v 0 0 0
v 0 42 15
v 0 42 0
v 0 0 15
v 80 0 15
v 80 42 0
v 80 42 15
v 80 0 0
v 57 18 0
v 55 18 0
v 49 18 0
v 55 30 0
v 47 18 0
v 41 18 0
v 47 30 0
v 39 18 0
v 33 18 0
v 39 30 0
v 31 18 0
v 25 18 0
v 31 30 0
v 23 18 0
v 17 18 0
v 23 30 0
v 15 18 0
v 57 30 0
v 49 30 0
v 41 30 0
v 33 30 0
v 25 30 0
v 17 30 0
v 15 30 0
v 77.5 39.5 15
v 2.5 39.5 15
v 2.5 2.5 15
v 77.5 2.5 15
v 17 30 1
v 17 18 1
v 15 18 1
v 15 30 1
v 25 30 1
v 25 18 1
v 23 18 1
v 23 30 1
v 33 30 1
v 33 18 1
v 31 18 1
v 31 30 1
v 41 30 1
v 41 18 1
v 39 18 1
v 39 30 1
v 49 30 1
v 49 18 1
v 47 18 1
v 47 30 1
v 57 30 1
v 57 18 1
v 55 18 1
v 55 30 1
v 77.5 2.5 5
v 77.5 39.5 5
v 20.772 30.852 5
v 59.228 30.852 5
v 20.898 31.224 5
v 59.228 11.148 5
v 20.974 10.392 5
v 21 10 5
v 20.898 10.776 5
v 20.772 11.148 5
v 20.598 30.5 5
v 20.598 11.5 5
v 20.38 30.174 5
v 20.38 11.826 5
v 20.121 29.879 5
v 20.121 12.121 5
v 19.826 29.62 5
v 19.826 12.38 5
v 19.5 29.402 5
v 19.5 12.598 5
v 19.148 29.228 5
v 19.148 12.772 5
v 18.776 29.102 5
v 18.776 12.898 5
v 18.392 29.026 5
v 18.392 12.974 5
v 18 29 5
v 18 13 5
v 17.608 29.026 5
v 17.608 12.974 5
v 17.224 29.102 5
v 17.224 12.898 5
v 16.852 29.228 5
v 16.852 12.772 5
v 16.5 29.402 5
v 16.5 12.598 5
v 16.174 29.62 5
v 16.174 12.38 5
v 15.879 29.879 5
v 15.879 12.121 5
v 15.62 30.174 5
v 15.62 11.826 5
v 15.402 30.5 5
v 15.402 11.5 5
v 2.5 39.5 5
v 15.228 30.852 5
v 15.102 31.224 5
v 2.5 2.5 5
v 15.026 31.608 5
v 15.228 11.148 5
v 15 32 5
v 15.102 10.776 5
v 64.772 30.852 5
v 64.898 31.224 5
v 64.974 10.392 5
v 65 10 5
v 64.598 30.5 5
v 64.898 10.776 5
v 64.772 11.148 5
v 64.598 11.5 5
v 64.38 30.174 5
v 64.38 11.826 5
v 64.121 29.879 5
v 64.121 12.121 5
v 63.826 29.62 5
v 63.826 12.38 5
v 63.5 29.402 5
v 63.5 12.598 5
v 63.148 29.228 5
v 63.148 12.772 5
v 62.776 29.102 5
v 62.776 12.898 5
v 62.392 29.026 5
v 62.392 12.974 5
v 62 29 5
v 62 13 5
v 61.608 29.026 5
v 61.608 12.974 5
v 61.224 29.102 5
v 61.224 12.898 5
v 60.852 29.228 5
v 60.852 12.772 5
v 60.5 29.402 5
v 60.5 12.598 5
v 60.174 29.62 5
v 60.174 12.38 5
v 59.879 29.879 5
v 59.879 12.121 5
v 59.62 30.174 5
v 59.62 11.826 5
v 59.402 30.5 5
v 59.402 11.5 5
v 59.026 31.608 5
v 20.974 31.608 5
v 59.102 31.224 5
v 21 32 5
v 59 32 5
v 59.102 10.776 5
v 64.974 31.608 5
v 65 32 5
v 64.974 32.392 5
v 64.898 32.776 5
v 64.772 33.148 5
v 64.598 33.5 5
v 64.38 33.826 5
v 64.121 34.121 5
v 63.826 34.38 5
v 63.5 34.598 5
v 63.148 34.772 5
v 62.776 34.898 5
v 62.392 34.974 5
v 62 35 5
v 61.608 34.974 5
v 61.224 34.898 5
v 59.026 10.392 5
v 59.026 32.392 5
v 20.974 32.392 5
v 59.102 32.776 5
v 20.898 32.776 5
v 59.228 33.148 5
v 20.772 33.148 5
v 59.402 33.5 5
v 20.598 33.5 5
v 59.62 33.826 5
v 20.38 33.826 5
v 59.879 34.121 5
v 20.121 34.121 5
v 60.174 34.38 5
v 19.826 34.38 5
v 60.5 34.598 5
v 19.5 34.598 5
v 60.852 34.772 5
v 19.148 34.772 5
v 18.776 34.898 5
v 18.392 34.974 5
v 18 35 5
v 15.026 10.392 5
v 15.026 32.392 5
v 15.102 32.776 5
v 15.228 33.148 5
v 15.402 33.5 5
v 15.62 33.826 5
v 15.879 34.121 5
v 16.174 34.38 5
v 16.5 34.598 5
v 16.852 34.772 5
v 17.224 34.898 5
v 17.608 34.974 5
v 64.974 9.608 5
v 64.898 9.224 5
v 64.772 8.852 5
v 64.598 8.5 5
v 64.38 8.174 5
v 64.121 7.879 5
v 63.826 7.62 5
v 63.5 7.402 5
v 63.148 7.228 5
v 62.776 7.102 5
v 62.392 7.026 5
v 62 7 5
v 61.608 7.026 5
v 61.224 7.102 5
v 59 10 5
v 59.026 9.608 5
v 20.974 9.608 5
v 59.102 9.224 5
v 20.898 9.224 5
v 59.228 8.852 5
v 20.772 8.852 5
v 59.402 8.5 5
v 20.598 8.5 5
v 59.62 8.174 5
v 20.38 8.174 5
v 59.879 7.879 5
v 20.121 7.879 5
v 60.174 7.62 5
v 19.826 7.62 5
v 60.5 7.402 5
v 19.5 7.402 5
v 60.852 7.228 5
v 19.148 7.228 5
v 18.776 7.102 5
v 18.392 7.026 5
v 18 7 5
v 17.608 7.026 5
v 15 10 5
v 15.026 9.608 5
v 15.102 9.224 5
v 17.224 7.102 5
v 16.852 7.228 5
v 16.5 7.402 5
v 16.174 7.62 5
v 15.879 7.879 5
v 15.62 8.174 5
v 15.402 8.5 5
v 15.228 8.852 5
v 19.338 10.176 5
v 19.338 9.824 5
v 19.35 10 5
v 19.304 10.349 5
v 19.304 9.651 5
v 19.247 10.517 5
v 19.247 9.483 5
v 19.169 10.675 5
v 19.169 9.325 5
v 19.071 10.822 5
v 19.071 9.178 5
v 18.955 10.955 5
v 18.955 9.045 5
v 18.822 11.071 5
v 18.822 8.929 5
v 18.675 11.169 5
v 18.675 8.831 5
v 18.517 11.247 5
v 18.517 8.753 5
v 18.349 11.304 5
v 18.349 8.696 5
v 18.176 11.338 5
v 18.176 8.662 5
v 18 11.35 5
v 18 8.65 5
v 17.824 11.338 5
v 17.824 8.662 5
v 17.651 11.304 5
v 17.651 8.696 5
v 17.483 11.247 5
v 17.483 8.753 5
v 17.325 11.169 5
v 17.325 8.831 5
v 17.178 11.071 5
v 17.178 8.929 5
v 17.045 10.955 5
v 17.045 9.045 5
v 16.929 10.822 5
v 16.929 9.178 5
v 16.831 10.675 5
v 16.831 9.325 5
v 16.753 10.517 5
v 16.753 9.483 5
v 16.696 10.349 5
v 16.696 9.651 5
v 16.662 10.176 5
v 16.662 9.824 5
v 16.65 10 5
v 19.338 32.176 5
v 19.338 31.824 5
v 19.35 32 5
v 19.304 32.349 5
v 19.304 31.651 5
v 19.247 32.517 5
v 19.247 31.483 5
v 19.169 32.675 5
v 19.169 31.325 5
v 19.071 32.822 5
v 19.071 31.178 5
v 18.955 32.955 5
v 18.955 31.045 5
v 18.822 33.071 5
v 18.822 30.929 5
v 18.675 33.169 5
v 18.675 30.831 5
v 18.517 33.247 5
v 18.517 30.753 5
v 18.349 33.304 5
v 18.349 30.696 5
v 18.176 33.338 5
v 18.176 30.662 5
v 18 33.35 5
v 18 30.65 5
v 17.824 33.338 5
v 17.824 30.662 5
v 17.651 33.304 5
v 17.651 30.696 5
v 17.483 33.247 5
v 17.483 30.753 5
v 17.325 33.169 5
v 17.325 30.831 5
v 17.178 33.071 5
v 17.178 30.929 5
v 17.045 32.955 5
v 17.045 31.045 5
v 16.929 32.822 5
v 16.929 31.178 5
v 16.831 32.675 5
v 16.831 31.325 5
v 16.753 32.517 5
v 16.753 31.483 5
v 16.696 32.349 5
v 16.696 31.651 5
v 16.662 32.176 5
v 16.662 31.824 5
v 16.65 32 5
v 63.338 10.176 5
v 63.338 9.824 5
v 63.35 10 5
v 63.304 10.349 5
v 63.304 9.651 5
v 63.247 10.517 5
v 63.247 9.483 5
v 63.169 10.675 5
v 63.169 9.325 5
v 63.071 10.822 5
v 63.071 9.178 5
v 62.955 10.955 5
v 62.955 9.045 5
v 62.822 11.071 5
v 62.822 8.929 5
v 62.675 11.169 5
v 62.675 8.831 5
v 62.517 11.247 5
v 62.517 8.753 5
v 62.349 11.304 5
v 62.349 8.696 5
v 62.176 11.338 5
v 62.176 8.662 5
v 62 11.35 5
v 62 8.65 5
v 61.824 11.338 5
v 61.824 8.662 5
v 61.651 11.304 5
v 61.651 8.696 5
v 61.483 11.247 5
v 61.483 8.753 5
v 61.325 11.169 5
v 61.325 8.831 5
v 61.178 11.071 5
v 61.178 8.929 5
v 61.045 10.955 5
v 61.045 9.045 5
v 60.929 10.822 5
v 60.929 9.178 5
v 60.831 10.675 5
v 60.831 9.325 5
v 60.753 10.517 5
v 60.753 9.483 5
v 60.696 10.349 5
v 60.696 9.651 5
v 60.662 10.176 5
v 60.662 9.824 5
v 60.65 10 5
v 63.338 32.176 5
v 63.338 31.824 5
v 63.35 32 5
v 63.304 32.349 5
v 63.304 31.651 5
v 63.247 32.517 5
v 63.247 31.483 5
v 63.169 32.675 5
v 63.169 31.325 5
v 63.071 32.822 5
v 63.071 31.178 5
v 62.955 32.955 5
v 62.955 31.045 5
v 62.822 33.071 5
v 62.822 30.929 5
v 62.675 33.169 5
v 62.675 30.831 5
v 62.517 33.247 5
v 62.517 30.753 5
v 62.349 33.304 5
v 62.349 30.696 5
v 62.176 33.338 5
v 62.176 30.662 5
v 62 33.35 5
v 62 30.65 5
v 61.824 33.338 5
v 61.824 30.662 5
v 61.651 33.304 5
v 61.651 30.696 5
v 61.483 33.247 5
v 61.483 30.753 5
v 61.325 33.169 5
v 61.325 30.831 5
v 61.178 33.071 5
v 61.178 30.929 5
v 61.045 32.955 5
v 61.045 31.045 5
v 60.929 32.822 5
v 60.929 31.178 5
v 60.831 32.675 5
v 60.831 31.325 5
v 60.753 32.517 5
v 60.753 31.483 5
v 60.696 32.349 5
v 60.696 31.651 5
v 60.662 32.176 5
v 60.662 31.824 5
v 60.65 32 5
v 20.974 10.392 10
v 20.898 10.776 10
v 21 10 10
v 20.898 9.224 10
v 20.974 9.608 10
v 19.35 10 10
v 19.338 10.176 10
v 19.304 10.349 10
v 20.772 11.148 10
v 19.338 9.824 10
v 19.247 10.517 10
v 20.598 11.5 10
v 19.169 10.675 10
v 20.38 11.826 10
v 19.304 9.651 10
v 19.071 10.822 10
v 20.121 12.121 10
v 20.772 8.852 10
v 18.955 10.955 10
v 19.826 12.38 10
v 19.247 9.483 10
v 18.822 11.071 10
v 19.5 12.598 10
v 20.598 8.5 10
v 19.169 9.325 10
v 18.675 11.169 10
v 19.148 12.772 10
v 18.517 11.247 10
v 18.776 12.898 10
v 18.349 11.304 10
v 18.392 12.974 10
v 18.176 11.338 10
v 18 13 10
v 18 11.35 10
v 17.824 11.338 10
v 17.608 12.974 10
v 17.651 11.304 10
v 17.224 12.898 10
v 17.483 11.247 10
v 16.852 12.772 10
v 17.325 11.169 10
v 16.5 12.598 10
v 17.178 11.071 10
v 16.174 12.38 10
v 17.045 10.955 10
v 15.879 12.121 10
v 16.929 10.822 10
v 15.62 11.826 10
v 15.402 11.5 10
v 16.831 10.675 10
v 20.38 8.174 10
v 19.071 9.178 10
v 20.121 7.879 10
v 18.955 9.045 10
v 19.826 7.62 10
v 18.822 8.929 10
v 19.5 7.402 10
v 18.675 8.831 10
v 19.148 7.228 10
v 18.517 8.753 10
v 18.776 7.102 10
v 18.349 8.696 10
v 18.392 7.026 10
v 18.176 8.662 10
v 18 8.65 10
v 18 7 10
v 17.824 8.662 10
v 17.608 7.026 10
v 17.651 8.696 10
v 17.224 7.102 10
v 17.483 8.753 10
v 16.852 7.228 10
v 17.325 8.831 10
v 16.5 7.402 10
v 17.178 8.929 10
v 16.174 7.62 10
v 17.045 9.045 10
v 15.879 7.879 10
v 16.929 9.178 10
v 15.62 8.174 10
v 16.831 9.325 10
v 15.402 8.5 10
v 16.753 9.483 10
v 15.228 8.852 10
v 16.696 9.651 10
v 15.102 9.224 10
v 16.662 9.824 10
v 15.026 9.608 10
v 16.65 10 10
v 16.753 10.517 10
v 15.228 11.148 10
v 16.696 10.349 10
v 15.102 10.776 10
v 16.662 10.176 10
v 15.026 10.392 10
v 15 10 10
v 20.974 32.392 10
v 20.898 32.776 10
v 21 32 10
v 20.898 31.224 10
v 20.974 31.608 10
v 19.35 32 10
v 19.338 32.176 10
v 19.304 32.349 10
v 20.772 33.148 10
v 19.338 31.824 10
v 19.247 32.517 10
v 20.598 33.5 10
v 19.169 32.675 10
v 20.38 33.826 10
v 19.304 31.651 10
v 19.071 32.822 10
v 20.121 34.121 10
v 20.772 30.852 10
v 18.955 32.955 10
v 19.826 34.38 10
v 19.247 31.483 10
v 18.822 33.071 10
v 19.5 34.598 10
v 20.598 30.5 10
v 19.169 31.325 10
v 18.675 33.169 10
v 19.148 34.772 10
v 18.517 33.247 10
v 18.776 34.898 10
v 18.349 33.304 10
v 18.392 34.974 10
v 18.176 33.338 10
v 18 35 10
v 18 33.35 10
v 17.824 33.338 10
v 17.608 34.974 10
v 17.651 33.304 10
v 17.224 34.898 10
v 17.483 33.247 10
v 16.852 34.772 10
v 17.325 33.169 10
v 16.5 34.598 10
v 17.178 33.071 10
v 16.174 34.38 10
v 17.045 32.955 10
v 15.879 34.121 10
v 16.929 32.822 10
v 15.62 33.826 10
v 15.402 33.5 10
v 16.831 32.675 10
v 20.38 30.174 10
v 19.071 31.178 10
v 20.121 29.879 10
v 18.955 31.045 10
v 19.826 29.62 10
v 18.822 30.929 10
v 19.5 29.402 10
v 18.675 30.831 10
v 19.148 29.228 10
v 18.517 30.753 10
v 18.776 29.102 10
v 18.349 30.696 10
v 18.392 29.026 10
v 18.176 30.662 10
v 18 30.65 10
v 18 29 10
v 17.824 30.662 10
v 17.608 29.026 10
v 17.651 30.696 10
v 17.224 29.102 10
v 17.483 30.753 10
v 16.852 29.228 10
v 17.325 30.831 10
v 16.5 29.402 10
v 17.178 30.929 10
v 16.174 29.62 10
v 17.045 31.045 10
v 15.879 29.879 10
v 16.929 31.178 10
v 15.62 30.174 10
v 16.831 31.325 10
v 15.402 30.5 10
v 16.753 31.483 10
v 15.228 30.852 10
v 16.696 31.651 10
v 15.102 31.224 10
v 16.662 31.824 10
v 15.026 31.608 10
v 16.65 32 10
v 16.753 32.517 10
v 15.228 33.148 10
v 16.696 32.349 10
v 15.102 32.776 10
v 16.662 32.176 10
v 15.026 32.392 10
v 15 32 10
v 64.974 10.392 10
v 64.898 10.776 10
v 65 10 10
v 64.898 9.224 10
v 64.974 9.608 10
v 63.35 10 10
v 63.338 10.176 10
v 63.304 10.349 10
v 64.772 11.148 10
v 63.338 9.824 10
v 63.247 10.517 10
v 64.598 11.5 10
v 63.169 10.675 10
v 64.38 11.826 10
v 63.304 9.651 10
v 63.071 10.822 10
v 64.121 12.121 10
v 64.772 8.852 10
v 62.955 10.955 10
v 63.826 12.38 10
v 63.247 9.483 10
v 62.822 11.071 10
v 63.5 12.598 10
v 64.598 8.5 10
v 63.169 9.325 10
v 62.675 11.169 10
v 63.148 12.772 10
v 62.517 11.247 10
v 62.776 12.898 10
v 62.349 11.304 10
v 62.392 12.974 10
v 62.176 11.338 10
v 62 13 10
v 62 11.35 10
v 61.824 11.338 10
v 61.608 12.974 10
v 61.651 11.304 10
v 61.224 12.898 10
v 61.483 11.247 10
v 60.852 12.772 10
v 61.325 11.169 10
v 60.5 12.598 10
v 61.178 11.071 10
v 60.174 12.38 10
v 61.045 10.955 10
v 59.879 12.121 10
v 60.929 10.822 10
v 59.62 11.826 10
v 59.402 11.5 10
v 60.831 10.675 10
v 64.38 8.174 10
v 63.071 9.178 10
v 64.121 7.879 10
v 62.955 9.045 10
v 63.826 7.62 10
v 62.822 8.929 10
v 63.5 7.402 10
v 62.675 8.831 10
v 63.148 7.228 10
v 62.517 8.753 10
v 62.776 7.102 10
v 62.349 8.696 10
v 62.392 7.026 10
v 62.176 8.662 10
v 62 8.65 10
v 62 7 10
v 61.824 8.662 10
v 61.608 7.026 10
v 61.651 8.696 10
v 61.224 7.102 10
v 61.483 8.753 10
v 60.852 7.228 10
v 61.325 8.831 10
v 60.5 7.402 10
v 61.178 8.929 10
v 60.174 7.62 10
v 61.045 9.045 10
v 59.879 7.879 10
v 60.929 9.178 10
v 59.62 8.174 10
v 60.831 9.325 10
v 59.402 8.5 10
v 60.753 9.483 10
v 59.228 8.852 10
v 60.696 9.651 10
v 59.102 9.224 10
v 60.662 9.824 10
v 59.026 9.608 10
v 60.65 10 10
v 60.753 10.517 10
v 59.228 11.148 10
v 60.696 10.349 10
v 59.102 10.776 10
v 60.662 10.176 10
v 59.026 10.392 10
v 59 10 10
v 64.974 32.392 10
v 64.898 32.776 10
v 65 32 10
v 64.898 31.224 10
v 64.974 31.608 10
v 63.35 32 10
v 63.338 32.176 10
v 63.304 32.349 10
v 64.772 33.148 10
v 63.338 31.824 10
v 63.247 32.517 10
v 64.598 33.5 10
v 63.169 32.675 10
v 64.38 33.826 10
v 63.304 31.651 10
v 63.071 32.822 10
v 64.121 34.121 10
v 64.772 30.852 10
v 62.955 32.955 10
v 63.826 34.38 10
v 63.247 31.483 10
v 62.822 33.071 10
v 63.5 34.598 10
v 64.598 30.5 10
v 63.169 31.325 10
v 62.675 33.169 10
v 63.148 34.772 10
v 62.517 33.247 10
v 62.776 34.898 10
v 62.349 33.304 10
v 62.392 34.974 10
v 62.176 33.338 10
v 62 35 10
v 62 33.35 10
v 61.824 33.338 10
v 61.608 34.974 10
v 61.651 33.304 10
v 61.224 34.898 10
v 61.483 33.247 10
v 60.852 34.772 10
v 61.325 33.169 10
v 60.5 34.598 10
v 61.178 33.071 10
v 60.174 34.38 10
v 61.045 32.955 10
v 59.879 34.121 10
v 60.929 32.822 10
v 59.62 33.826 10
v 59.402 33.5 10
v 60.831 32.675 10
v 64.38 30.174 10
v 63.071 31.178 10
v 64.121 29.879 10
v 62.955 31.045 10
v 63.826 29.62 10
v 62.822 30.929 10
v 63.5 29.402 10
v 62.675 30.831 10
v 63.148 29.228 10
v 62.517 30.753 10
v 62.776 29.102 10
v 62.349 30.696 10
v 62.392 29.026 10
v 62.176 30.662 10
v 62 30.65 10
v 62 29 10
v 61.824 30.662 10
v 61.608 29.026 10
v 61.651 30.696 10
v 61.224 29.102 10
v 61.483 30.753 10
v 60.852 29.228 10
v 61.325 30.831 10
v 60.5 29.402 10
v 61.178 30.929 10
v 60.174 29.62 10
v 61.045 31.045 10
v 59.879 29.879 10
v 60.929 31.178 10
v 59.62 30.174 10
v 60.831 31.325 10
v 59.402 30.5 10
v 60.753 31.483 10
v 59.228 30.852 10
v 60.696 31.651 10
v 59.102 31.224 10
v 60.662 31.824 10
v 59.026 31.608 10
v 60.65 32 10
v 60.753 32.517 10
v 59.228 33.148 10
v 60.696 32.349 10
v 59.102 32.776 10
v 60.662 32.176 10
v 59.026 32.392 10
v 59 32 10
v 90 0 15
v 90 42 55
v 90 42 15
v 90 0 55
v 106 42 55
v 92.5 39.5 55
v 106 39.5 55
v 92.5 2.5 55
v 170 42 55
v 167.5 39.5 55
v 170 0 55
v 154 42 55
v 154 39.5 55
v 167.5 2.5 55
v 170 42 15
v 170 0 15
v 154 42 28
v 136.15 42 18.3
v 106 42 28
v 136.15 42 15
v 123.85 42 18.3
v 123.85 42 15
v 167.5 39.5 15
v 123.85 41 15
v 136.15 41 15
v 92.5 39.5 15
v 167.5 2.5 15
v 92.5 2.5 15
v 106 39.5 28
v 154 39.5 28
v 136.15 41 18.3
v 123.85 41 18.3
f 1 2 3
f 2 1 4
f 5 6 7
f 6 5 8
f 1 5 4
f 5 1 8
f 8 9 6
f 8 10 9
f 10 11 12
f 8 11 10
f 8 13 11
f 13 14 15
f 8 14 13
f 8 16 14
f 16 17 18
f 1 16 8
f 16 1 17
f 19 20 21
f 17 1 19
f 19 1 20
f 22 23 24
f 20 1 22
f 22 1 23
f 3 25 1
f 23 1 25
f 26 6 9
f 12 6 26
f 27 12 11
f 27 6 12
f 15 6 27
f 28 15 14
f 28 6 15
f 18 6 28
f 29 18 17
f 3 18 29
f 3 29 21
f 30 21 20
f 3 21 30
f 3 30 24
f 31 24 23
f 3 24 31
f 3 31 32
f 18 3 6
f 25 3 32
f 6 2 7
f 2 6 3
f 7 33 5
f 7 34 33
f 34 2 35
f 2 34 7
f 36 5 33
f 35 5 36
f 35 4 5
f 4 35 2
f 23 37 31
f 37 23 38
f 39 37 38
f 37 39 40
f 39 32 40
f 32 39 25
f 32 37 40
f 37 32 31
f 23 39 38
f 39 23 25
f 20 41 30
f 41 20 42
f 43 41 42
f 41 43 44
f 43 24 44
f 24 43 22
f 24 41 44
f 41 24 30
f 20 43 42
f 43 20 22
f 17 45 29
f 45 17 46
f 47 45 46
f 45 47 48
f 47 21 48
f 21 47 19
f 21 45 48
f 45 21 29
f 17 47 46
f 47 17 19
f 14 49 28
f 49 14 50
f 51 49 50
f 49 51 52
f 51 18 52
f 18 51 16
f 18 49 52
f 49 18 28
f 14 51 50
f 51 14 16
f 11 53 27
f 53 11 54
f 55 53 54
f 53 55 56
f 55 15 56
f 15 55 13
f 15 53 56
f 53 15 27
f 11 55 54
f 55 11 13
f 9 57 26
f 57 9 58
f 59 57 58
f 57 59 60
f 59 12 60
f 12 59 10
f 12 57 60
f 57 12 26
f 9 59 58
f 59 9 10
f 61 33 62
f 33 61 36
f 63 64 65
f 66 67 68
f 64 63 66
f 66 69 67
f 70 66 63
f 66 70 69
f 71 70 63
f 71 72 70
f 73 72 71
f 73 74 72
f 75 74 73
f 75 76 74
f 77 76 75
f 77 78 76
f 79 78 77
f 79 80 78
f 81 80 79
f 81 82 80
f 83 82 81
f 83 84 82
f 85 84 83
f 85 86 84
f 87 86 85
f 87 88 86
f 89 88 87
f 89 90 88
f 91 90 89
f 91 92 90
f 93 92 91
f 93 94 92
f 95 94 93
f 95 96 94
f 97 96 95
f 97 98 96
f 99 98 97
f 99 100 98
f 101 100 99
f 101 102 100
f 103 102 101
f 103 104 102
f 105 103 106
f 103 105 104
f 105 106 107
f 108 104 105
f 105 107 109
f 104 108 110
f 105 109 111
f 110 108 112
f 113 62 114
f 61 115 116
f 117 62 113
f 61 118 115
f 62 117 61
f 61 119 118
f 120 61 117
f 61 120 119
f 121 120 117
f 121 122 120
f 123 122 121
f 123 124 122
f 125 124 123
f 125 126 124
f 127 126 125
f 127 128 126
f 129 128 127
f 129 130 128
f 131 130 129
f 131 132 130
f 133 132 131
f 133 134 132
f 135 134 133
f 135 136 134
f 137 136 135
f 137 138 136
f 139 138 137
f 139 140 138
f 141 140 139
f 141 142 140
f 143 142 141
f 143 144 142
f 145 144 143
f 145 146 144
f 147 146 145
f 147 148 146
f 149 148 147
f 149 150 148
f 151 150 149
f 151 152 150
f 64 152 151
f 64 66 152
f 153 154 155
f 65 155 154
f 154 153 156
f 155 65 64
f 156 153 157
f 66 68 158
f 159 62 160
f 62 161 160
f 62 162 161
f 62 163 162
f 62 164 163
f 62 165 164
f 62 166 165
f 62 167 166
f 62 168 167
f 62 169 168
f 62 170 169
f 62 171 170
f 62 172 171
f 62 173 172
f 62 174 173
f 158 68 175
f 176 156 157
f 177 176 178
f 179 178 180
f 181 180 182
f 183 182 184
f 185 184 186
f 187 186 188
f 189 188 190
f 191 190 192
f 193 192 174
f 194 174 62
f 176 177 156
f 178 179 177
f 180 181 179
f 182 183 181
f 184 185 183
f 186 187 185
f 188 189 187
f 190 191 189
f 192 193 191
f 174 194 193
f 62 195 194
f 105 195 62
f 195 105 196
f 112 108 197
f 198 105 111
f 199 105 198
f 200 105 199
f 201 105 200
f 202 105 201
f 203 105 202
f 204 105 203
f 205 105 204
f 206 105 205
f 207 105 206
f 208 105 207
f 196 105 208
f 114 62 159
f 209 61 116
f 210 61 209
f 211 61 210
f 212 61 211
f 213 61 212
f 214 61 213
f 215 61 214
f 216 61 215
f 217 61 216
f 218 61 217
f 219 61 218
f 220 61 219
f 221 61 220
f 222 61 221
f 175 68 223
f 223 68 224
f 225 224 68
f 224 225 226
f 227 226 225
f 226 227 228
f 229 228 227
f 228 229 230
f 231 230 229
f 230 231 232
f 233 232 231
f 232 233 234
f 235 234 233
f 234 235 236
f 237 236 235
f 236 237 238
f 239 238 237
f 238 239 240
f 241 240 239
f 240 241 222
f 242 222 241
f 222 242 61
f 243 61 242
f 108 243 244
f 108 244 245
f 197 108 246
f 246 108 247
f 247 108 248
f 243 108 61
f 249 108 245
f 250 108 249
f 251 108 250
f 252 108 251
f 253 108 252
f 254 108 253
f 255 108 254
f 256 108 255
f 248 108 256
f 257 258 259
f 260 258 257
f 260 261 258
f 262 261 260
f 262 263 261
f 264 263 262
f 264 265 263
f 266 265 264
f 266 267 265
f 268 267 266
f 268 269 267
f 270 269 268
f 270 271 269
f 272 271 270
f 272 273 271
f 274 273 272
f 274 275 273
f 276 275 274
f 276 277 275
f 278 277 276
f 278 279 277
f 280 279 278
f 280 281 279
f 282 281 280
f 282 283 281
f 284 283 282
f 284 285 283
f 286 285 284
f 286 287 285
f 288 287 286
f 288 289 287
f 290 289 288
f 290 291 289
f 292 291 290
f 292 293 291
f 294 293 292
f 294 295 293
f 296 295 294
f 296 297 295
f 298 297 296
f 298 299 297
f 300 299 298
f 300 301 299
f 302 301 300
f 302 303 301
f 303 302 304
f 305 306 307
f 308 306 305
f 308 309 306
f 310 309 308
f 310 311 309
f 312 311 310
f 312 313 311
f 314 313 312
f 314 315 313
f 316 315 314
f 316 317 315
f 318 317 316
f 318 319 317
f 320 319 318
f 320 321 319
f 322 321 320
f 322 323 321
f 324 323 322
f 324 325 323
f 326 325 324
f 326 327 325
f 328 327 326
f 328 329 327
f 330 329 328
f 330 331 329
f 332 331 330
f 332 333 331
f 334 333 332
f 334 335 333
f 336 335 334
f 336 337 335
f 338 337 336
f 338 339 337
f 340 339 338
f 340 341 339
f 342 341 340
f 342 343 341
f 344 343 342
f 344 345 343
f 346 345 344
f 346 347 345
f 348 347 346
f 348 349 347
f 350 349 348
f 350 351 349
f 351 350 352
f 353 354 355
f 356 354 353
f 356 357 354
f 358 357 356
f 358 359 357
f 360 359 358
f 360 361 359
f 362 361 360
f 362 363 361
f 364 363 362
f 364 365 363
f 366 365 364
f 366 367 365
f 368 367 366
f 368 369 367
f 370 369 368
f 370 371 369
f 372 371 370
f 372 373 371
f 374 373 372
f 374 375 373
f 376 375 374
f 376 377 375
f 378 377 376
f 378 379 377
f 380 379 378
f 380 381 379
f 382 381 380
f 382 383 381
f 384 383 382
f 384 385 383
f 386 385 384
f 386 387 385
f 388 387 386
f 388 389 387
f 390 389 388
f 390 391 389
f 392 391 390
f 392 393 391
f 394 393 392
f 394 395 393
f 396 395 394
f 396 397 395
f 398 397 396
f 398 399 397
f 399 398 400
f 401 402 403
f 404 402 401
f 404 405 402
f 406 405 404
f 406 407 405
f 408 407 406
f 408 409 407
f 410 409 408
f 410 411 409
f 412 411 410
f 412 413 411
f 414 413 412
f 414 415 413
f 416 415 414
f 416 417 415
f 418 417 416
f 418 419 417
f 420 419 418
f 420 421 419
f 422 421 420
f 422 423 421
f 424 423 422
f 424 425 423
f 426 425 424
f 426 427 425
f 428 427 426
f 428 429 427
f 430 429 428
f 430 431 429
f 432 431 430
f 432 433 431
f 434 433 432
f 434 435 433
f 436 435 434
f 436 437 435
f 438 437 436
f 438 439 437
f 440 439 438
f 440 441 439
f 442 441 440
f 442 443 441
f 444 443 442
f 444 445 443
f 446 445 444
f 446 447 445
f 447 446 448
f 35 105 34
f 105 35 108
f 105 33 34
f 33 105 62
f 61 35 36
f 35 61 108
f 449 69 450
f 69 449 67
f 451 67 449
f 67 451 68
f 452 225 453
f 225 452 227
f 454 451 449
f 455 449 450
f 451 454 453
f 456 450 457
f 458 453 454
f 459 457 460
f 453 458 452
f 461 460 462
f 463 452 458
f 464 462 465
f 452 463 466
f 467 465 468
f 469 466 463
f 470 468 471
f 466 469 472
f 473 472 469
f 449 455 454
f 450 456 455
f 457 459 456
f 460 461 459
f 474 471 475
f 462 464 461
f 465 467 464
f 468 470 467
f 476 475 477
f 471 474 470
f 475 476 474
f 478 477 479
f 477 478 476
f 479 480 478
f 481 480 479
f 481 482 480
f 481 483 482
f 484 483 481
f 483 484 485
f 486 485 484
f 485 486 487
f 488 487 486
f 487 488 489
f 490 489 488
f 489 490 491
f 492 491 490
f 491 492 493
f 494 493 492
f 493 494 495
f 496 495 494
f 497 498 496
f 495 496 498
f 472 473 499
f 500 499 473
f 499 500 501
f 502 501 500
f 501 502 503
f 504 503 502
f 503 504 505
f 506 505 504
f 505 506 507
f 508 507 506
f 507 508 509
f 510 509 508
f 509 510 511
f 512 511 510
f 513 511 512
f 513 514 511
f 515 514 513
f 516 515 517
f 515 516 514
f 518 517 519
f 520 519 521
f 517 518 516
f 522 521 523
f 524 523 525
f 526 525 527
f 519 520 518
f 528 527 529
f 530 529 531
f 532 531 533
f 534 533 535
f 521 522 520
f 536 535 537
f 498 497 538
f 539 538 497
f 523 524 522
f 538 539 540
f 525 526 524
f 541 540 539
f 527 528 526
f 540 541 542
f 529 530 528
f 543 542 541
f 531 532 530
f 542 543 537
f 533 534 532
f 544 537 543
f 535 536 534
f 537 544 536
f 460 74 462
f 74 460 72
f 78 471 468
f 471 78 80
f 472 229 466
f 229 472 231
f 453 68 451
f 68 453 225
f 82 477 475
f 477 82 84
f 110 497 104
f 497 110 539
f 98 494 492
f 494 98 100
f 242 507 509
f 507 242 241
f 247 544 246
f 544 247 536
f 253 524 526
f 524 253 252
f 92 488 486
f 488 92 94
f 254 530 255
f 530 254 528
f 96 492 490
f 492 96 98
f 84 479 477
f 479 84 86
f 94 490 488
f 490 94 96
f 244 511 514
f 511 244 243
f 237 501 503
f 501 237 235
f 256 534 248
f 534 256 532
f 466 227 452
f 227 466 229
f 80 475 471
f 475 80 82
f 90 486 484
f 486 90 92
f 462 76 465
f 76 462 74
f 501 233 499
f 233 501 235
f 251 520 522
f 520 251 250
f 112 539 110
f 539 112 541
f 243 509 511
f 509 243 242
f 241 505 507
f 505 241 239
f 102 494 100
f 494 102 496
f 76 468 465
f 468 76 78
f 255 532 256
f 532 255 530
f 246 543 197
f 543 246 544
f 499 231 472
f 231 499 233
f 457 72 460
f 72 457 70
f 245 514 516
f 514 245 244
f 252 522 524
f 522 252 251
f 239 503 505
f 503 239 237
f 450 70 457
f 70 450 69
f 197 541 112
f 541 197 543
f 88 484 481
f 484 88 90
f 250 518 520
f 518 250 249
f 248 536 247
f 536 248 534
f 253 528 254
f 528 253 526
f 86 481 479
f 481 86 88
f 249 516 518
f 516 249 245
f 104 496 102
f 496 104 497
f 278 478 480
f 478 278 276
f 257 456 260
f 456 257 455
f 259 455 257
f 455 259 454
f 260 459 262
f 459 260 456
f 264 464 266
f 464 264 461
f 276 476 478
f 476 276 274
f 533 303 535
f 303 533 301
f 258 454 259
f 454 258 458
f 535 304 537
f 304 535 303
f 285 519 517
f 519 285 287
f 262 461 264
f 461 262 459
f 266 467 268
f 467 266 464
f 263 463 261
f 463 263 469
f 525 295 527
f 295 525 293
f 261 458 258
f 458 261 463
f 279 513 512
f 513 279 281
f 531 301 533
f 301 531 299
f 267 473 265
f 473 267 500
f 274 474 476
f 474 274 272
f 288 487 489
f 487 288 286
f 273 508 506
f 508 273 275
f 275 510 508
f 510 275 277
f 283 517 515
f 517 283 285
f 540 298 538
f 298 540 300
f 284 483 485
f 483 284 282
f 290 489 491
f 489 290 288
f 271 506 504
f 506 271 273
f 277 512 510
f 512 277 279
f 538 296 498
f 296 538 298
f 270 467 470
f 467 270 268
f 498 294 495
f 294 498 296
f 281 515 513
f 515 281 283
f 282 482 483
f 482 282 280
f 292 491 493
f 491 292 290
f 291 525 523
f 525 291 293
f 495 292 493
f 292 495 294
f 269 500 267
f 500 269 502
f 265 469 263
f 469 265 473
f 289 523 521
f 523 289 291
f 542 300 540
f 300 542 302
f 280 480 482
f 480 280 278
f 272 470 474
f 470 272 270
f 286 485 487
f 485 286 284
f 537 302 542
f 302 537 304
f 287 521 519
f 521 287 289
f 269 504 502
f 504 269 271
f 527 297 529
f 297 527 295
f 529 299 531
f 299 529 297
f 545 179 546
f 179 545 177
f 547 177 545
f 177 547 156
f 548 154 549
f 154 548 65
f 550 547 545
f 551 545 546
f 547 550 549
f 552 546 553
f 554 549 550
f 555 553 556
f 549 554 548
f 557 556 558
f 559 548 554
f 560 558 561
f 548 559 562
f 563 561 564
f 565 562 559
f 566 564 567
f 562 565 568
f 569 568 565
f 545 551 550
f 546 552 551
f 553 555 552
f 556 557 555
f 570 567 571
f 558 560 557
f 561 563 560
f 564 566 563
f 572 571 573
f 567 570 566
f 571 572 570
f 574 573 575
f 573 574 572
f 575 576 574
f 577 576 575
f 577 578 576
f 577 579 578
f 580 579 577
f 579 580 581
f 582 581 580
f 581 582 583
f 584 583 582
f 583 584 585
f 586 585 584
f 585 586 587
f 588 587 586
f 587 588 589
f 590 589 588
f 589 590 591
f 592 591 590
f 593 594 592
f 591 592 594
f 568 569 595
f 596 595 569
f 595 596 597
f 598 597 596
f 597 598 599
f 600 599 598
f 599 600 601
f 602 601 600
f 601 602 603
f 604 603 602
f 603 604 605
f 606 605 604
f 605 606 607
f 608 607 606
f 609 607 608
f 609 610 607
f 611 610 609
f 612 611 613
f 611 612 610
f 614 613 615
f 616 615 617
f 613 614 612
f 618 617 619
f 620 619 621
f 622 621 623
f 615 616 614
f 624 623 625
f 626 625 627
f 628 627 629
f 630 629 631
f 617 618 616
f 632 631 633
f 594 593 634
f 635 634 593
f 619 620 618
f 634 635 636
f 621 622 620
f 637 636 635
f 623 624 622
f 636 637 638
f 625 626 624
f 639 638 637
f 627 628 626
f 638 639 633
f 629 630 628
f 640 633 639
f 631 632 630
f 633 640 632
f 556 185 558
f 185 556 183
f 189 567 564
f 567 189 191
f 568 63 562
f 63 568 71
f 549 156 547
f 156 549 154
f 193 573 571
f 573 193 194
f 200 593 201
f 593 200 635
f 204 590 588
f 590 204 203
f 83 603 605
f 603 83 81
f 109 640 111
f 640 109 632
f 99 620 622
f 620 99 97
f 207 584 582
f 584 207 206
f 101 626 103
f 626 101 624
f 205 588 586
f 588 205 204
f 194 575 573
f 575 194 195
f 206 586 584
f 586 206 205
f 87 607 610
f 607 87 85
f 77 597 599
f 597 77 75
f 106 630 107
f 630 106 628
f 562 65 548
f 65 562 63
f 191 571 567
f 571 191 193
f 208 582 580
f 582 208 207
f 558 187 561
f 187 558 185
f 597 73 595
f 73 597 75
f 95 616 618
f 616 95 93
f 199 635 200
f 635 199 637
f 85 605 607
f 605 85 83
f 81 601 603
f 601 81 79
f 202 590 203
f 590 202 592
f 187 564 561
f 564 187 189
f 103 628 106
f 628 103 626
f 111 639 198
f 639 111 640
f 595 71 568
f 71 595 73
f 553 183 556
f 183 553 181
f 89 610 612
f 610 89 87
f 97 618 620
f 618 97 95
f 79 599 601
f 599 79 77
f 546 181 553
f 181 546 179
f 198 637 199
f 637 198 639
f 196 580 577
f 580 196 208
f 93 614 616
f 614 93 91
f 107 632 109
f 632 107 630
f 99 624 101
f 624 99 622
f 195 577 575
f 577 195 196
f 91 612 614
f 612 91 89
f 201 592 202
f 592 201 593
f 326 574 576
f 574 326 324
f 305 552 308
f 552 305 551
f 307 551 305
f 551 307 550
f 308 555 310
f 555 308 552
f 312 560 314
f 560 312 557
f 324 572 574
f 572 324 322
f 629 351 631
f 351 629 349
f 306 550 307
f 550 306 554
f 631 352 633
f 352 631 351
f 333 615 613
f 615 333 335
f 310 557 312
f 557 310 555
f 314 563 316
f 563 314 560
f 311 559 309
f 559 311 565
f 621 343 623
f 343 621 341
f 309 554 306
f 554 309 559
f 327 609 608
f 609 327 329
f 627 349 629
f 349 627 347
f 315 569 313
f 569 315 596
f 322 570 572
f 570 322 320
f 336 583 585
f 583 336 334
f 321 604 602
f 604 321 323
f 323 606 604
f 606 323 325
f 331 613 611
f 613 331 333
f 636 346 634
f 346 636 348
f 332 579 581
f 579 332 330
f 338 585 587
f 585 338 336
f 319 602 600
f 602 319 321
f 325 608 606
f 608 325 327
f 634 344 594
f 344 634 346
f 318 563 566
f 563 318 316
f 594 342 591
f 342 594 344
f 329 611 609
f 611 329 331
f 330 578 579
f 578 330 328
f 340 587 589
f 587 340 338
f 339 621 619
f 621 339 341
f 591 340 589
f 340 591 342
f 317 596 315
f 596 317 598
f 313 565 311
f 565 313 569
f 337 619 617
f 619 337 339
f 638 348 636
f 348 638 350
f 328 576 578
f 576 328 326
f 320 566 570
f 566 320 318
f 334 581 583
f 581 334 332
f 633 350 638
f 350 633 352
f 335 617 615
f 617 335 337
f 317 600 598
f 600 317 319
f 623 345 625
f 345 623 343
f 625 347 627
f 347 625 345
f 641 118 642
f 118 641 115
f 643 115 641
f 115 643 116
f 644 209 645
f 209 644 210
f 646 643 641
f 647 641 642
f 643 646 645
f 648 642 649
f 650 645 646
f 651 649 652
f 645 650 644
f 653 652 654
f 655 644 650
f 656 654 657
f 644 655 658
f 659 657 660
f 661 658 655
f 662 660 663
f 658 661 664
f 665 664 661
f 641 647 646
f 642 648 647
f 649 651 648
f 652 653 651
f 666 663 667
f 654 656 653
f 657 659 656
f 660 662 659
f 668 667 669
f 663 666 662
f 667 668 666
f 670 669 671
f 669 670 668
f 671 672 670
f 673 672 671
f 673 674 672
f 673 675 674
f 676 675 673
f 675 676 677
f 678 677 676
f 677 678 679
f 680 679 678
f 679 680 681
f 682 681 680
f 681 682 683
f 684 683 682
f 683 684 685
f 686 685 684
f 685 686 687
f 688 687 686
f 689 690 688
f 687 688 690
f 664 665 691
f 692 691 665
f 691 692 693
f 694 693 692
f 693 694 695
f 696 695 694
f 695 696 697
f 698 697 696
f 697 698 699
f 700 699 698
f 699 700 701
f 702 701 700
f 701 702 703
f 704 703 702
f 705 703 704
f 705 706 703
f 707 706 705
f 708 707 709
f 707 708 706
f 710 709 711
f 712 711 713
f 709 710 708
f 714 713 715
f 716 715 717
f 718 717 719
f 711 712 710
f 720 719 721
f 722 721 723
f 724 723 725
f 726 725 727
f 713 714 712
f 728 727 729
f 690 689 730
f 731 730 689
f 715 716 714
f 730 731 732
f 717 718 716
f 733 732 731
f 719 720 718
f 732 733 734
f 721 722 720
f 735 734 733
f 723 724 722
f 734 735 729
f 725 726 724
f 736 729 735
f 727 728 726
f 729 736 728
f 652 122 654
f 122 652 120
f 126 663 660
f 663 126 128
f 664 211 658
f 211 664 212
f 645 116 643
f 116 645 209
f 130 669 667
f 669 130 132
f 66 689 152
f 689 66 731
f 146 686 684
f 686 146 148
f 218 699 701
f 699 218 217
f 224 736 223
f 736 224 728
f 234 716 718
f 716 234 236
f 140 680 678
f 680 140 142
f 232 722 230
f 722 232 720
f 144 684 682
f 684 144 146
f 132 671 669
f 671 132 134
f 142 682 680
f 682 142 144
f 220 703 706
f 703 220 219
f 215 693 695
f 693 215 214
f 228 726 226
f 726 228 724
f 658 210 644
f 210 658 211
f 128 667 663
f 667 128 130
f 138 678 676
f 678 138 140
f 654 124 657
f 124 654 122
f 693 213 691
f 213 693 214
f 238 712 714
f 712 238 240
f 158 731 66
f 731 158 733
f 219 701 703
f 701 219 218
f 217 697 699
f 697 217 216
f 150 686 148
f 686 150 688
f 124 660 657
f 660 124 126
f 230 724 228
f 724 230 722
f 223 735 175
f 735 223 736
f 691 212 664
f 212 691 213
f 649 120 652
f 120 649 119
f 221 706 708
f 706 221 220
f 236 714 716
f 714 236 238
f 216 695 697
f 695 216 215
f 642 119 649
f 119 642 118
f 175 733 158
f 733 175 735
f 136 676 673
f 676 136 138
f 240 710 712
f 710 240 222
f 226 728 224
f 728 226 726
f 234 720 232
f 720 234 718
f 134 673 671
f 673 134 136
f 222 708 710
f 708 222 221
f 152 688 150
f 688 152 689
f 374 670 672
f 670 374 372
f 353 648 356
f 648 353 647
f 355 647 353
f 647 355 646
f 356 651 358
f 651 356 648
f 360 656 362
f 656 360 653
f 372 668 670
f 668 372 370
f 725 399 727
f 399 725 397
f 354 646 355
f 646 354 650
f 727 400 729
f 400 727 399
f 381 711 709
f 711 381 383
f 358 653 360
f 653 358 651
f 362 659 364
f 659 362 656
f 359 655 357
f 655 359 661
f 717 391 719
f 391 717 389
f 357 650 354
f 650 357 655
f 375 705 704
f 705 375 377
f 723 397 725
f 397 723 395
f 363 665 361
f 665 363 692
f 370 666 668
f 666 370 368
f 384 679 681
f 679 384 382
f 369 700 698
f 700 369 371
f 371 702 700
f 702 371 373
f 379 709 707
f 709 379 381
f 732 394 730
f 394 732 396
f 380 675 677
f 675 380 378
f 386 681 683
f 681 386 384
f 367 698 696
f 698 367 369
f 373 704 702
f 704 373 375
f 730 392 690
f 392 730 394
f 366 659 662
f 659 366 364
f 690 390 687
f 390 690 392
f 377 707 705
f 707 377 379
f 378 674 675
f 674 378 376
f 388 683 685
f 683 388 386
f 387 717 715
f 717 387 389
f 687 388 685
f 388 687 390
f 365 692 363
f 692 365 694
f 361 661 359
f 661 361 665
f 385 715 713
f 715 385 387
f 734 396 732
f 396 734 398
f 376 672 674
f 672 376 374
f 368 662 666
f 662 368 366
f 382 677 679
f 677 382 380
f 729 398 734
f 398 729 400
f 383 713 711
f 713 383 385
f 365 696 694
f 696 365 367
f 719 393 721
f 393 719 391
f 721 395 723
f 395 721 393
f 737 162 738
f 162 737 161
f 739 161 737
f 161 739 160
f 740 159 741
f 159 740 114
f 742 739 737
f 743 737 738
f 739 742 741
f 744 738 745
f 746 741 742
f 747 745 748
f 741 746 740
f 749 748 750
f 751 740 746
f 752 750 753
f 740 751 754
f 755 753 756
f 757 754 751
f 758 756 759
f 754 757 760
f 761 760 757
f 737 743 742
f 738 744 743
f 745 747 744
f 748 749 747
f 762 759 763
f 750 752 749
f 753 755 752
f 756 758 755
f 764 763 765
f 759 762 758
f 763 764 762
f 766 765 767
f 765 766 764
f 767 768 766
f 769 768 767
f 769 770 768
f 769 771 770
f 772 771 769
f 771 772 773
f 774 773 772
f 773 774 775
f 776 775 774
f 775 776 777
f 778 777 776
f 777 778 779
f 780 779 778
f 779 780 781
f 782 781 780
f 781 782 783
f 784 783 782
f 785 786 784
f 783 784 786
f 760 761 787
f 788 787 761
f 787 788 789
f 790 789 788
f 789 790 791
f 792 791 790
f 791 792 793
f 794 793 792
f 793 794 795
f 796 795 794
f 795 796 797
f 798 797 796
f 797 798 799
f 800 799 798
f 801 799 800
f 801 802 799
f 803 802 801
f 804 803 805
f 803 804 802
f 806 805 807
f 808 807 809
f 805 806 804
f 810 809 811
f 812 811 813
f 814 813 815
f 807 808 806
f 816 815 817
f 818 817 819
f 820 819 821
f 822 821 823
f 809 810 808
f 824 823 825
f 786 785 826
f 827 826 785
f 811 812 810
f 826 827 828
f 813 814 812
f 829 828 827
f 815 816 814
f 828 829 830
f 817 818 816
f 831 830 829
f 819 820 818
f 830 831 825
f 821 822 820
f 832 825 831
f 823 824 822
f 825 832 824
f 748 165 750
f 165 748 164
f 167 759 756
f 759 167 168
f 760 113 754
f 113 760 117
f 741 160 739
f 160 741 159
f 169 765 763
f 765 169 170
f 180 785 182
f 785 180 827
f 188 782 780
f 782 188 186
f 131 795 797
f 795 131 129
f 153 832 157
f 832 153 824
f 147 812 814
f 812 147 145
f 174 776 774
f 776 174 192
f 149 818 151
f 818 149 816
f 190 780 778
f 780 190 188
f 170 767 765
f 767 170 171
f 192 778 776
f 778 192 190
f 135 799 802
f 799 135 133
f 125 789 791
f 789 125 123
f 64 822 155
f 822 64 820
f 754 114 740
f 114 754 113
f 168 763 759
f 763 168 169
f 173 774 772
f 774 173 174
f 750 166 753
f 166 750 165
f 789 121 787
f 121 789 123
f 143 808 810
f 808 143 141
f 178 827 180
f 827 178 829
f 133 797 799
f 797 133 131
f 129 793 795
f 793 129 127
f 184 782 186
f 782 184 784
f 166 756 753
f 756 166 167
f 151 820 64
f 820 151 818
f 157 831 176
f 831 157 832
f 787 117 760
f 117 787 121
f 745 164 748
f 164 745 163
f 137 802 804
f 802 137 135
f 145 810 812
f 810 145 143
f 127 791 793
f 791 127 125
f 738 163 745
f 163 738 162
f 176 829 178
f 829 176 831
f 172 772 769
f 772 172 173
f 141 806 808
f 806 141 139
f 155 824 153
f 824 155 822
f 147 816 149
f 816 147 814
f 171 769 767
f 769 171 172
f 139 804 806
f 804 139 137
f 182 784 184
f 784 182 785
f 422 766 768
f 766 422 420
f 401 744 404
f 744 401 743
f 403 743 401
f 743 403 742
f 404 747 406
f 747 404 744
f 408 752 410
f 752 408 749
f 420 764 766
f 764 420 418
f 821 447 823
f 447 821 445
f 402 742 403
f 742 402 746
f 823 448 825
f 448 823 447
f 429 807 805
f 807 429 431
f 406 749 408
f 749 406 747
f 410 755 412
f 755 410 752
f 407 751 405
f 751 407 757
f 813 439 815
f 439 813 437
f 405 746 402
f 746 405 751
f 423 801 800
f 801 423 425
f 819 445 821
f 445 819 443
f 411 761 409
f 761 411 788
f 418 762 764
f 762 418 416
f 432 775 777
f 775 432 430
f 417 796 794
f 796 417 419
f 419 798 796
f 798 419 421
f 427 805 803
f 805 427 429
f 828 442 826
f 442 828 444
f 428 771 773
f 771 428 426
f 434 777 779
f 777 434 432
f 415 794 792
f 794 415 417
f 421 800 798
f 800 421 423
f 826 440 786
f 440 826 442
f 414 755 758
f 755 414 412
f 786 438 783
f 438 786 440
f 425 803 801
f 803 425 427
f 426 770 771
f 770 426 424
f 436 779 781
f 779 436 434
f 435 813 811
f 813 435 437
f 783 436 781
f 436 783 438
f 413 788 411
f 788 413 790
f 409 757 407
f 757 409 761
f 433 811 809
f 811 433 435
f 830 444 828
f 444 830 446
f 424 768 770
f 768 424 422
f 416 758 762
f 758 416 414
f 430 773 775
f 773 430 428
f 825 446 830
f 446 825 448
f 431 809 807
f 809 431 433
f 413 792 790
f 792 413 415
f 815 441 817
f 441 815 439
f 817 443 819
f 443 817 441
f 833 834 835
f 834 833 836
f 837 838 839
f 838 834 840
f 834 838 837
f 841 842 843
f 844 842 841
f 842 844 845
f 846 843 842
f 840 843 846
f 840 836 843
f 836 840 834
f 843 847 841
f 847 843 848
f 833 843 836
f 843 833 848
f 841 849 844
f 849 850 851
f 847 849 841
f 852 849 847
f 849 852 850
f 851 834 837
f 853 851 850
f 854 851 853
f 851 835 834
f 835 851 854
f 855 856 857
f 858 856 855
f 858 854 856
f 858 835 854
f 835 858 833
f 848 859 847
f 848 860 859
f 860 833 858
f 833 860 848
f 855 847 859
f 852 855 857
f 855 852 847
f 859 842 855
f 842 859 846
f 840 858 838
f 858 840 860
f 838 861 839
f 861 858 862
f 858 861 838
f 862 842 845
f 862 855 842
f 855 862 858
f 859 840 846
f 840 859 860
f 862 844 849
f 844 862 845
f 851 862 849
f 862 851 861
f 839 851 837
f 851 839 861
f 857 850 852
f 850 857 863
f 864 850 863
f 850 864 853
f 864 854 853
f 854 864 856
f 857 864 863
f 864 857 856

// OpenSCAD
// Retro Macintosh-style enclosure
// Units: mm

$fn=48;

// Overall dimensions
body_x = 80;
body_y = 42;
body_z = 55;

wall = 2.5;
base_thickness = 5;

// Split height
split_z = 15;

// Main outer shell with slight Macintosh taper
module outer_body() {
    hull() {
        translate([0,0,0]) cube([80,42,55], center=false);
        translate([2,1,4]) cube([76,40,47], center=false);
    }
}

module screen_cutout() {
    translate([16, 3, 28])
        cube([48, 40, 36]);
}

module usb_cutout() {
    // 12x11 plus tolerance
    translate([33.85, 41, 7])
        cube([12.3, 5, 11.3]);
}

module speaker_holes() {
    for (r=[0:2])
      for (c=[0:3])
        translate([30 + c*5, -1, 12 + r*5])
          rotate([90,0,0])
            cylinder(h=6,d=2.0);
}

module ribs() {
    for (i=[0:5])
      translate([18, -0.5, 8 + i*2.5])
        cube([44,4,0.8]);
}

module top_shell() {
    difference() {
        intersection() {
            outer_body();
            translate([-5,-5,split_z]) cube([100,100,100]);
        }

        translate([wall,wall,split_z])
            cube([body_x-2*wall, body_y-2*wall, body_z]);

        screen_cutout();
        usb_cutout();
        speaker_holes();
    }
}

module bottom_base() {
    difference() {
        intersection() {
            outer_body();
            translate([-5,-5,-5]) cube([100,100,split_z+5]);
        }

        translate([wall,wall,base_thickness])
            cube([body_x-2*wall, body_y-2*wall, split_z]);

        // ventilation slots
        for(i=[0:5])
          translate([15+i*8, 18, -1])
            cube([2,12,2]);
    }

    // ESP32 standoffs (approx)
    for (x=[18,62])
      for (y=[10,32])
        translate([x,y,base_thickness])
        difference() {
            cylinder(h=5,d=6);
            cylinder(h=5,d=2.7);
        }
}

translate([0,0,0]) bottom_base();
translate([90,0,0]) top_shell();
